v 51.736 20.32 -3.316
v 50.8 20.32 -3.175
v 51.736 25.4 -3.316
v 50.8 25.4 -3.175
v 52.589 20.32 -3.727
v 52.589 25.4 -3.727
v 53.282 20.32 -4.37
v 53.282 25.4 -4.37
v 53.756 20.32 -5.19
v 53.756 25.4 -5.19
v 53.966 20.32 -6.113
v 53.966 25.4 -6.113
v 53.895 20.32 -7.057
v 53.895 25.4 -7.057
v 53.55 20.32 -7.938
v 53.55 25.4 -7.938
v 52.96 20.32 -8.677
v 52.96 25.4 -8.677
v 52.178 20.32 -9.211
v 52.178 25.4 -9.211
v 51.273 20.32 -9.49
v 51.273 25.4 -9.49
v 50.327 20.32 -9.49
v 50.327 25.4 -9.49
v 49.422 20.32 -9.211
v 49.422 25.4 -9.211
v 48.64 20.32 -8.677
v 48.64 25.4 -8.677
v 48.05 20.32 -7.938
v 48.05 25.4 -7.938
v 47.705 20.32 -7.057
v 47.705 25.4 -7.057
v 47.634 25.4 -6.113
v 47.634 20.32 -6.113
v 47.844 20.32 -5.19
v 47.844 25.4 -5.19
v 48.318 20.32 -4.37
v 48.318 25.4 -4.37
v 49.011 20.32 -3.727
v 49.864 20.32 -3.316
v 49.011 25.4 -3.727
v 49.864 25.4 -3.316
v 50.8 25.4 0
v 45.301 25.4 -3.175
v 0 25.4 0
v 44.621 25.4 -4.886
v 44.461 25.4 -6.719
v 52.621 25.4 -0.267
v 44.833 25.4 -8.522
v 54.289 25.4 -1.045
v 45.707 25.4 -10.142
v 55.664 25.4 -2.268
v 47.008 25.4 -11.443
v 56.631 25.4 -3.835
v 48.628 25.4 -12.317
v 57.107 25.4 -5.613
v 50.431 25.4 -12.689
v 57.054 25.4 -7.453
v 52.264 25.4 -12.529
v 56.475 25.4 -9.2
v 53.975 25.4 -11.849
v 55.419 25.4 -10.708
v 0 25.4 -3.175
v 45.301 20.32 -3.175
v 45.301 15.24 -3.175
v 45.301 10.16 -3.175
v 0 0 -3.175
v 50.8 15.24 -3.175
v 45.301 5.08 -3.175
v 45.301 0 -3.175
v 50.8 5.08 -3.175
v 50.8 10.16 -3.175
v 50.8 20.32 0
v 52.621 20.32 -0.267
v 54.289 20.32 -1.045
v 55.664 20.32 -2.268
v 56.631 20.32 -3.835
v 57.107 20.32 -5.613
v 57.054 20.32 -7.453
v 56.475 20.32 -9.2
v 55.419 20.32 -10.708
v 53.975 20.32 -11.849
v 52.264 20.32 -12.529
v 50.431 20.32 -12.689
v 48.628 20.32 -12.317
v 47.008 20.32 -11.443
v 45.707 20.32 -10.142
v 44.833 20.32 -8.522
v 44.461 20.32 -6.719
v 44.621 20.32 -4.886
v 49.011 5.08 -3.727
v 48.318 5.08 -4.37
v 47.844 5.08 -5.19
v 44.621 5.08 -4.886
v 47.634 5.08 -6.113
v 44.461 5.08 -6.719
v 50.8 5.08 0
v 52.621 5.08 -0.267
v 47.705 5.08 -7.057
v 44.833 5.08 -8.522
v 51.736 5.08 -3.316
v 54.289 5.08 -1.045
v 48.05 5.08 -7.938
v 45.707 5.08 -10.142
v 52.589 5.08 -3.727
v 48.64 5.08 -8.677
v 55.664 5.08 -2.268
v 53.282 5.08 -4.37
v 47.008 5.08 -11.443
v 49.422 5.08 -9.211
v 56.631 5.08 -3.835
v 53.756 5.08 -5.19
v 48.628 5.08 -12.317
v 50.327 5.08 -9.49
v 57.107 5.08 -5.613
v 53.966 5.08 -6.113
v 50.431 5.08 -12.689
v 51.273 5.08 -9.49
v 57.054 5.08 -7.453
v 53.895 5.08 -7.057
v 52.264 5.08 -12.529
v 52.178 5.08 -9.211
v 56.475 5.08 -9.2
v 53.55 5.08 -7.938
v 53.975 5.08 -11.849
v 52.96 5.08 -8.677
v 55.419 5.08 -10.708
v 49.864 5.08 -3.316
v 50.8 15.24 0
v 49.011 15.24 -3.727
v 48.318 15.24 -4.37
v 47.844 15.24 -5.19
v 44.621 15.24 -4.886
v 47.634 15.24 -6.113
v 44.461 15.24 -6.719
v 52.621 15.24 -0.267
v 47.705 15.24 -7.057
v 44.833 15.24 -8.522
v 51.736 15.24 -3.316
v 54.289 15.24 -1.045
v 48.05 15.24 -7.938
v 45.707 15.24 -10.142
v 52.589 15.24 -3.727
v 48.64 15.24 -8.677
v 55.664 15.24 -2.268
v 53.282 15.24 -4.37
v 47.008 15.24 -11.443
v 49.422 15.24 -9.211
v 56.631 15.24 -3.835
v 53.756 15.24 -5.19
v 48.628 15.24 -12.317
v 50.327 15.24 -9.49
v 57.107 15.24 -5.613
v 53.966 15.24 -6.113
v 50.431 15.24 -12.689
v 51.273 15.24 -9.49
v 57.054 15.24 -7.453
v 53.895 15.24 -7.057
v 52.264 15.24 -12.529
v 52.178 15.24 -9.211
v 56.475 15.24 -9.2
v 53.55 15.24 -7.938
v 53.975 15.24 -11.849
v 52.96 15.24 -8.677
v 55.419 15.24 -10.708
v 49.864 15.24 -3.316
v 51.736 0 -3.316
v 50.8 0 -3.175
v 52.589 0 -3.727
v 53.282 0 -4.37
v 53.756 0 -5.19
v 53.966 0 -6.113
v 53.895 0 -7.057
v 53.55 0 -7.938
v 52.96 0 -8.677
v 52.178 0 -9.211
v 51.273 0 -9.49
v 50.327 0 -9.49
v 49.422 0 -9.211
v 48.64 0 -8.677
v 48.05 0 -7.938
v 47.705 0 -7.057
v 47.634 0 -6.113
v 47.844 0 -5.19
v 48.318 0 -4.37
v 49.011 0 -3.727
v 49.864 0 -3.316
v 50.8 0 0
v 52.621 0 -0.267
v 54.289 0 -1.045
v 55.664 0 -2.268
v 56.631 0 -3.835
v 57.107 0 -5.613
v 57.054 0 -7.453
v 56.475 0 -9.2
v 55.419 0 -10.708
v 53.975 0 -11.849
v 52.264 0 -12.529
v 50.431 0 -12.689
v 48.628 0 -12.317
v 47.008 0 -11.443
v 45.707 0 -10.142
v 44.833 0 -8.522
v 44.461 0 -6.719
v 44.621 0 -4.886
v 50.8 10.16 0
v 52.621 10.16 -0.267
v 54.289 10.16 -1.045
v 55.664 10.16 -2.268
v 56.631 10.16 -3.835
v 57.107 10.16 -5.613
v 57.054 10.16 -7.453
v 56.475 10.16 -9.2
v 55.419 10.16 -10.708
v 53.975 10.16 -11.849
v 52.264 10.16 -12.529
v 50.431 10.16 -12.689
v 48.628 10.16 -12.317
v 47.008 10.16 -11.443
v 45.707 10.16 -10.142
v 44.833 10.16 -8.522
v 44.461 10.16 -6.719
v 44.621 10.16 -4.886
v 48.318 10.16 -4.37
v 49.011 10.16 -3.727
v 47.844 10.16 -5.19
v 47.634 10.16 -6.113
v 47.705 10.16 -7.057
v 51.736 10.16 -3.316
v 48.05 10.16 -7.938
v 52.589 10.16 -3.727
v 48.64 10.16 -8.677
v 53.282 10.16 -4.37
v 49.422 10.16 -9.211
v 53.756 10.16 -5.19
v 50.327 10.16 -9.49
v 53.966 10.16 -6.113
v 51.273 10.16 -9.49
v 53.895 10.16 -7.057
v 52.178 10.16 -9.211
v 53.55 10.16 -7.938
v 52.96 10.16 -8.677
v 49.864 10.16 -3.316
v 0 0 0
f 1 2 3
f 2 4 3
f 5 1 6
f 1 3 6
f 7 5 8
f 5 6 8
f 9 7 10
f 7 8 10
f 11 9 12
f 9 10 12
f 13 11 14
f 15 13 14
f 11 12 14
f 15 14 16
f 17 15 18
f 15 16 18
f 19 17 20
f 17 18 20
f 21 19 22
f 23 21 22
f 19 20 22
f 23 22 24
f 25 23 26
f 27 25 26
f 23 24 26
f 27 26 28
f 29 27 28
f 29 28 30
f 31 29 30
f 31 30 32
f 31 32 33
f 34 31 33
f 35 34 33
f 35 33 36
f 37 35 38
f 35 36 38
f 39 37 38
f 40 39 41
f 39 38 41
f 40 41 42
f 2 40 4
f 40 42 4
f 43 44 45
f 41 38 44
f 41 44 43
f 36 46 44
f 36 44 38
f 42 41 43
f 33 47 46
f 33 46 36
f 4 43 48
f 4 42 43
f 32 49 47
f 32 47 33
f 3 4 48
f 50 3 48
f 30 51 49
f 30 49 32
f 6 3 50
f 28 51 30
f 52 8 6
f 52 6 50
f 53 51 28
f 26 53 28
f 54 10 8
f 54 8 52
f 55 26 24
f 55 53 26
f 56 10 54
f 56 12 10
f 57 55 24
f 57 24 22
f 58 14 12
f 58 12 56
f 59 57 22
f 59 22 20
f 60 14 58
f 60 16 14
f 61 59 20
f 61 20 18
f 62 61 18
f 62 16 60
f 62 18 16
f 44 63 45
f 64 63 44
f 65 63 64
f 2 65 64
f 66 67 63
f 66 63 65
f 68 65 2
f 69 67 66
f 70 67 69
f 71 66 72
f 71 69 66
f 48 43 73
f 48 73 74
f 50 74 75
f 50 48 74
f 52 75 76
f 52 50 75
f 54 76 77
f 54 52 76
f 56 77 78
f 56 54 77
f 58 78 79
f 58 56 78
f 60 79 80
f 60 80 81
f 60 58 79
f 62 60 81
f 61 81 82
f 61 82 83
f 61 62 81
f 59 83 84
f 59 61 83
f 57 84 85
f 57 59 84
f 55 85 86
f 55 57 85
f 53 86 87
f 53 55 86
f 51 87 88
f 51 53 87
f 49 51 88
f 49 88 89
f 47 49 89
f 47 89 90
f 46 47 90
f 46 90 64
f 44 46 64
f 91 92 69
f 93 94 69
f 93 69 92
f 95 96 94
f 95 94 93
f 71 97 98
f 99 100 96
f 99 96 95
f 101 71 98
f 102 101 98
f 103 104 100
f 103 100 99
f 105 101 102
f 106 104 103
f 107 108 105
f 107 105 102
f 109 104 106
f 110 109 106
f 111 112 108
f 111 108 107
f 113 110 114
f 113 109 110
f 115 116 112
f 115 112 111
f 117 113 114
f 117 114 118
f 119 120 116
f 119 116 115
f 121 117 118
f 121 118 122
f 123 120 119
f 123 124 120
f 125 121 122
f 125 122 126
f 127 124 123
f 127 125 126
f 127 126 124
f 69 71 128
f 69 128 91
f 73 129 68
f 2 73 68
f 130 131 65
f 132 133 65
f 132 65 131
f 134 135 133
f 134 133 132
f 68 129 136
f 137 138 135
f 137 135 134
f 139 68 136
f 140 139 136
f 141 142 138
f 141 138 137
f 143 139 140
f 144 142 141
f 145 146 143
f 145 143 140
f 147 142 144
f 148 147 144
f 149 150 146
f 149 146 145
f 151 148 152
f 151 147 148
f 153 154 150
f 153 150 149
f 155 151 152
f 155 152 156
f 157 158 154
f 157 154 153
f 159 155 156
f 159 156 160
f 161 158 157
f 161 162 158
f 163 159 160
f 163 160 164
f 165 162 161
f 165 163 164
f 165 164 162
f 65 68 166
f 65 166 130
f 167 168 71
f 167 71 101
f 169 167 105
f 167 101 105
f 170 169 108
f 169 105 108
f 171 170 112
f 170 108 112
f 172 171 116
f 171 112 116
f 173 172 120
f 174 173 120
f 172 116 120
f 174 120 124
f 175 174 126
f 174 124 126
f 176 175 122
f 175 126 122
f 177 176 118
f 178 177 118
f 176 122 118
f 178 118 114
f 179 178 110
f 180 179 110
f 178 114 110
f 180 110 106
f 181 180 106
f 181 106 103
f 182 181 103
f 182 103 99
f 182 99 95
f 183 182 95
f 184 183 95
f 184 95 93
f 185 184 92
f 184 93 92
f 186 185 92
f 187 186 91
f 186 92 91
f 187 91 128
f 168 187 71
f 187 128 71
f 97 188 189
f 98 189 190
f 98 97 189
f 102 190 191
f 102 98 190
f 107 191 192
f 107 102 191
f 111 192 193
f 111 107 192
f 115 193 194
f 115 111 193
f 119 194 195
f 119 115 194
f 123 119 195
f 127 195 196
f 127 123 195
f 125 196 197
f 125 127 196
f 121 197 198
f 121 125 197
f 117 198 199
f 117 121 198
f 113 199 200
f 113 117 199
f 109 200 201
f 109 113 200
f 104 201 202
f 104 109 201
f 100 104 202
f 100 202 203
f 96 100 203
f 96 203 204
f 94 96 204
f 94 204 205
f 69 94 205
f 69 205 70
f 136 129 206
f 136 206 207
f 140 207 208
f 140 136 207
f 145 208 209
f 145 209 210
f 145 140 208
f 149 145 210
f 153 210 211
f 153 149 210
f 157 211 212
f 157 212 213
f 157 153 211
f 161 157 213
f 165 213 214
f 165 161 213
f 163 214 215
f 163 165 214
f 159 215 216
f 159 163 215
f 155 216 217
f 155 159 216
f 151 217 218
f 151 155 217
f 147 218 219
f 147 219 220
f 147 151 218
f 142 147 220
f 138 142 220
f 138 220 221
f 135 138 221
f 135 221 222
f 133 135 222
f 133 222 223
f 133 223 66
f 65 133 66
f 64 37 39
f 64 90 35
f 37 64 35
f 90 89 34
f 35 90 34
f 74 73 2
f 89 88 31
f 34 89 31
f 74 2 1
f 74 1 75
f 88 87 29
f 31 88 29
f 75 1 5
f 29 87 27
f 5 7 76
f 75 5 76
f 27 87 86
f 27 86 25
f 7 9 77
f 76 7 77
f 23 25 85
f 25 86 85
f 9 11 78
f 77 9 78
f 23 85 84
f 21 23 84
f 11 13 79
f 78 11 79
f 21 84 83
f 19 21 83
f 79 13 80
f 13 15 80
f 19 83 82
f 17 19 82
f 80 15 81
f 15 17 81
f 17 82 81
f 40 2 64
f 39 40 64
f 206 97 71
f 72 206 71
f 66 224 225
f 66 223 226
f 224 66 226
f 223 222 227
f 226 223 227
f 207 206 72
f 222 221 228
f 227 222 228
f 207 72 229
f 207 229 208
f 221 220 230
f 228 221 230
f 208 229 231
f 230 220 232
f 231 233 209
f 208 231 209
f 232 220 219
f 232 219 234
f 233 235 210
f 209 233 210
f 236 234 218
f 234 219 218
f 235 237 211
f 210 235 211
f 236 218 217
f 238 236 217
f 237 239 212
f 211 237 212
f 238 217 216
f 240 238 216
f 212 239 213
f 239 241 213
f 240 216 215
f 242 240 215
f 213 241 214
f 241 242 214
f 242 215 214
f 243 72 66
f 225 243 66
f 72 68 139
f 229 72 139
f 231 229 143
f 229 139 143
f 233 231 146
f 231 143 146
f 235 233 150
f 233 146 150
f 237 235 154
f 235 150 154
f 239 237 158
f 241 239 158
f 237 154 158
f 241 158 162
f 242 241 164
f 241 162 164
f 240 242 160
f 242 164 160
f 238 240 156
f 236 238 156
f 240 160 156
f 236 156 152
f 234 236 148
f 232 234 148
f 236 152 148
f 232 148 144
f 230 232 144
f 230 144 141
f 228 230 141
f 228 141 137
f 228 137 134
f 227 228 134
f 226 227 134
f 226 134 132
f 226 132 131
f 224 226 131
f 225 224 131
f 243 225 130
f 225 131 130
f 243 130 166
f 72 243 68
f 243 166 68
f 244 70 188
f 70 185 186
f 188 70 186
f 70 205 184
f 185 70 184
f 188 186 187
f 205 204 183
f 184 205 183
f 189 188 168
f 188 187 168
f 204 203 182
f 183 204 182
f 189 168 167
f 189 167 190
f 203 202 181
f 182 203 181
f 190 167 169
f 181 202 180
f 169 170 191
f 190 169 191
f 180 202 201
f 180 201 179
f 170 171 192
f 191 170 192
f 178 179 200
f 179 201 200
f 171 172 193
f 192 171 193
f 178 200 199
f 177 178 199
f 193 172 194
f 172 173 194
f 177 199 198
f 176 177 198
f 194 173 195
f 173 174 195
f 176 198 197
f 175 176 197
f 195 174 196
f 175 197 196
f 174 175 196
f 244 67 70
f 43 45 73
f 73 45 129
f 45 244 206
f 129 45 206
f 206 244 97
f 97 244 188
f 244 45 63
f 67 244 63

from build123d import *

# Parameters (mm, degrees)
SKETCH1_W           = 50.8
SKETCH1_H           = 3.175
BOSS_EXTRUDE1_DEPTH = 25.4
SKETCH2_R           = 6.35
SKETCH2_R_2         = 3.175
BOSS_EXTRUDE2_DEPTH = 5.08
LPATTERN1_COUNT     = 3
LPATTERN1_PITCH     = 10.16


with BuildPart() as part:
    # Sketch1 → Boss-Extrude1 (new body)
    with BuildSketch(Plane(origin=(0, 0, 0), x_dir=(1, 0, 0), z_dir=(0, 1, 0))):
        with Locations((25.4, 1.5875)):
            Rectangle(SKETCH1_W, SKETCH1_H)
    extrude(amount=BOSS_EXTRUDE1_DEPTH)

    # Sketch2 → Boss-Extrude2 (add)
    with BuildSketch(Plane(origin=(0, 25.4, 0), x_dir=(1, 0, 0), z_dir=(0, 1, 0))):
        with Locations((50.8, 6.35)):
            Circle(SKETCH2_R)
        with Locations(Location((50.8, 6.35, 0), (0, 0, 270))):
            Circle(SKETCH2_R_2, mode=Mode.SUBTRACT)
    boss_extrude2 = extrude(amount=-BOSS_EXTRUDE2_DEPTH)

    # LPattern1: Boss-Extrude2 ×3
    with Locations(*[(0, -i * LPATTERN1_PITCH, 0) for i in range(1, LPATTERN1_COUNT)]):
        add(boss_extrude2)


solid = part.part
